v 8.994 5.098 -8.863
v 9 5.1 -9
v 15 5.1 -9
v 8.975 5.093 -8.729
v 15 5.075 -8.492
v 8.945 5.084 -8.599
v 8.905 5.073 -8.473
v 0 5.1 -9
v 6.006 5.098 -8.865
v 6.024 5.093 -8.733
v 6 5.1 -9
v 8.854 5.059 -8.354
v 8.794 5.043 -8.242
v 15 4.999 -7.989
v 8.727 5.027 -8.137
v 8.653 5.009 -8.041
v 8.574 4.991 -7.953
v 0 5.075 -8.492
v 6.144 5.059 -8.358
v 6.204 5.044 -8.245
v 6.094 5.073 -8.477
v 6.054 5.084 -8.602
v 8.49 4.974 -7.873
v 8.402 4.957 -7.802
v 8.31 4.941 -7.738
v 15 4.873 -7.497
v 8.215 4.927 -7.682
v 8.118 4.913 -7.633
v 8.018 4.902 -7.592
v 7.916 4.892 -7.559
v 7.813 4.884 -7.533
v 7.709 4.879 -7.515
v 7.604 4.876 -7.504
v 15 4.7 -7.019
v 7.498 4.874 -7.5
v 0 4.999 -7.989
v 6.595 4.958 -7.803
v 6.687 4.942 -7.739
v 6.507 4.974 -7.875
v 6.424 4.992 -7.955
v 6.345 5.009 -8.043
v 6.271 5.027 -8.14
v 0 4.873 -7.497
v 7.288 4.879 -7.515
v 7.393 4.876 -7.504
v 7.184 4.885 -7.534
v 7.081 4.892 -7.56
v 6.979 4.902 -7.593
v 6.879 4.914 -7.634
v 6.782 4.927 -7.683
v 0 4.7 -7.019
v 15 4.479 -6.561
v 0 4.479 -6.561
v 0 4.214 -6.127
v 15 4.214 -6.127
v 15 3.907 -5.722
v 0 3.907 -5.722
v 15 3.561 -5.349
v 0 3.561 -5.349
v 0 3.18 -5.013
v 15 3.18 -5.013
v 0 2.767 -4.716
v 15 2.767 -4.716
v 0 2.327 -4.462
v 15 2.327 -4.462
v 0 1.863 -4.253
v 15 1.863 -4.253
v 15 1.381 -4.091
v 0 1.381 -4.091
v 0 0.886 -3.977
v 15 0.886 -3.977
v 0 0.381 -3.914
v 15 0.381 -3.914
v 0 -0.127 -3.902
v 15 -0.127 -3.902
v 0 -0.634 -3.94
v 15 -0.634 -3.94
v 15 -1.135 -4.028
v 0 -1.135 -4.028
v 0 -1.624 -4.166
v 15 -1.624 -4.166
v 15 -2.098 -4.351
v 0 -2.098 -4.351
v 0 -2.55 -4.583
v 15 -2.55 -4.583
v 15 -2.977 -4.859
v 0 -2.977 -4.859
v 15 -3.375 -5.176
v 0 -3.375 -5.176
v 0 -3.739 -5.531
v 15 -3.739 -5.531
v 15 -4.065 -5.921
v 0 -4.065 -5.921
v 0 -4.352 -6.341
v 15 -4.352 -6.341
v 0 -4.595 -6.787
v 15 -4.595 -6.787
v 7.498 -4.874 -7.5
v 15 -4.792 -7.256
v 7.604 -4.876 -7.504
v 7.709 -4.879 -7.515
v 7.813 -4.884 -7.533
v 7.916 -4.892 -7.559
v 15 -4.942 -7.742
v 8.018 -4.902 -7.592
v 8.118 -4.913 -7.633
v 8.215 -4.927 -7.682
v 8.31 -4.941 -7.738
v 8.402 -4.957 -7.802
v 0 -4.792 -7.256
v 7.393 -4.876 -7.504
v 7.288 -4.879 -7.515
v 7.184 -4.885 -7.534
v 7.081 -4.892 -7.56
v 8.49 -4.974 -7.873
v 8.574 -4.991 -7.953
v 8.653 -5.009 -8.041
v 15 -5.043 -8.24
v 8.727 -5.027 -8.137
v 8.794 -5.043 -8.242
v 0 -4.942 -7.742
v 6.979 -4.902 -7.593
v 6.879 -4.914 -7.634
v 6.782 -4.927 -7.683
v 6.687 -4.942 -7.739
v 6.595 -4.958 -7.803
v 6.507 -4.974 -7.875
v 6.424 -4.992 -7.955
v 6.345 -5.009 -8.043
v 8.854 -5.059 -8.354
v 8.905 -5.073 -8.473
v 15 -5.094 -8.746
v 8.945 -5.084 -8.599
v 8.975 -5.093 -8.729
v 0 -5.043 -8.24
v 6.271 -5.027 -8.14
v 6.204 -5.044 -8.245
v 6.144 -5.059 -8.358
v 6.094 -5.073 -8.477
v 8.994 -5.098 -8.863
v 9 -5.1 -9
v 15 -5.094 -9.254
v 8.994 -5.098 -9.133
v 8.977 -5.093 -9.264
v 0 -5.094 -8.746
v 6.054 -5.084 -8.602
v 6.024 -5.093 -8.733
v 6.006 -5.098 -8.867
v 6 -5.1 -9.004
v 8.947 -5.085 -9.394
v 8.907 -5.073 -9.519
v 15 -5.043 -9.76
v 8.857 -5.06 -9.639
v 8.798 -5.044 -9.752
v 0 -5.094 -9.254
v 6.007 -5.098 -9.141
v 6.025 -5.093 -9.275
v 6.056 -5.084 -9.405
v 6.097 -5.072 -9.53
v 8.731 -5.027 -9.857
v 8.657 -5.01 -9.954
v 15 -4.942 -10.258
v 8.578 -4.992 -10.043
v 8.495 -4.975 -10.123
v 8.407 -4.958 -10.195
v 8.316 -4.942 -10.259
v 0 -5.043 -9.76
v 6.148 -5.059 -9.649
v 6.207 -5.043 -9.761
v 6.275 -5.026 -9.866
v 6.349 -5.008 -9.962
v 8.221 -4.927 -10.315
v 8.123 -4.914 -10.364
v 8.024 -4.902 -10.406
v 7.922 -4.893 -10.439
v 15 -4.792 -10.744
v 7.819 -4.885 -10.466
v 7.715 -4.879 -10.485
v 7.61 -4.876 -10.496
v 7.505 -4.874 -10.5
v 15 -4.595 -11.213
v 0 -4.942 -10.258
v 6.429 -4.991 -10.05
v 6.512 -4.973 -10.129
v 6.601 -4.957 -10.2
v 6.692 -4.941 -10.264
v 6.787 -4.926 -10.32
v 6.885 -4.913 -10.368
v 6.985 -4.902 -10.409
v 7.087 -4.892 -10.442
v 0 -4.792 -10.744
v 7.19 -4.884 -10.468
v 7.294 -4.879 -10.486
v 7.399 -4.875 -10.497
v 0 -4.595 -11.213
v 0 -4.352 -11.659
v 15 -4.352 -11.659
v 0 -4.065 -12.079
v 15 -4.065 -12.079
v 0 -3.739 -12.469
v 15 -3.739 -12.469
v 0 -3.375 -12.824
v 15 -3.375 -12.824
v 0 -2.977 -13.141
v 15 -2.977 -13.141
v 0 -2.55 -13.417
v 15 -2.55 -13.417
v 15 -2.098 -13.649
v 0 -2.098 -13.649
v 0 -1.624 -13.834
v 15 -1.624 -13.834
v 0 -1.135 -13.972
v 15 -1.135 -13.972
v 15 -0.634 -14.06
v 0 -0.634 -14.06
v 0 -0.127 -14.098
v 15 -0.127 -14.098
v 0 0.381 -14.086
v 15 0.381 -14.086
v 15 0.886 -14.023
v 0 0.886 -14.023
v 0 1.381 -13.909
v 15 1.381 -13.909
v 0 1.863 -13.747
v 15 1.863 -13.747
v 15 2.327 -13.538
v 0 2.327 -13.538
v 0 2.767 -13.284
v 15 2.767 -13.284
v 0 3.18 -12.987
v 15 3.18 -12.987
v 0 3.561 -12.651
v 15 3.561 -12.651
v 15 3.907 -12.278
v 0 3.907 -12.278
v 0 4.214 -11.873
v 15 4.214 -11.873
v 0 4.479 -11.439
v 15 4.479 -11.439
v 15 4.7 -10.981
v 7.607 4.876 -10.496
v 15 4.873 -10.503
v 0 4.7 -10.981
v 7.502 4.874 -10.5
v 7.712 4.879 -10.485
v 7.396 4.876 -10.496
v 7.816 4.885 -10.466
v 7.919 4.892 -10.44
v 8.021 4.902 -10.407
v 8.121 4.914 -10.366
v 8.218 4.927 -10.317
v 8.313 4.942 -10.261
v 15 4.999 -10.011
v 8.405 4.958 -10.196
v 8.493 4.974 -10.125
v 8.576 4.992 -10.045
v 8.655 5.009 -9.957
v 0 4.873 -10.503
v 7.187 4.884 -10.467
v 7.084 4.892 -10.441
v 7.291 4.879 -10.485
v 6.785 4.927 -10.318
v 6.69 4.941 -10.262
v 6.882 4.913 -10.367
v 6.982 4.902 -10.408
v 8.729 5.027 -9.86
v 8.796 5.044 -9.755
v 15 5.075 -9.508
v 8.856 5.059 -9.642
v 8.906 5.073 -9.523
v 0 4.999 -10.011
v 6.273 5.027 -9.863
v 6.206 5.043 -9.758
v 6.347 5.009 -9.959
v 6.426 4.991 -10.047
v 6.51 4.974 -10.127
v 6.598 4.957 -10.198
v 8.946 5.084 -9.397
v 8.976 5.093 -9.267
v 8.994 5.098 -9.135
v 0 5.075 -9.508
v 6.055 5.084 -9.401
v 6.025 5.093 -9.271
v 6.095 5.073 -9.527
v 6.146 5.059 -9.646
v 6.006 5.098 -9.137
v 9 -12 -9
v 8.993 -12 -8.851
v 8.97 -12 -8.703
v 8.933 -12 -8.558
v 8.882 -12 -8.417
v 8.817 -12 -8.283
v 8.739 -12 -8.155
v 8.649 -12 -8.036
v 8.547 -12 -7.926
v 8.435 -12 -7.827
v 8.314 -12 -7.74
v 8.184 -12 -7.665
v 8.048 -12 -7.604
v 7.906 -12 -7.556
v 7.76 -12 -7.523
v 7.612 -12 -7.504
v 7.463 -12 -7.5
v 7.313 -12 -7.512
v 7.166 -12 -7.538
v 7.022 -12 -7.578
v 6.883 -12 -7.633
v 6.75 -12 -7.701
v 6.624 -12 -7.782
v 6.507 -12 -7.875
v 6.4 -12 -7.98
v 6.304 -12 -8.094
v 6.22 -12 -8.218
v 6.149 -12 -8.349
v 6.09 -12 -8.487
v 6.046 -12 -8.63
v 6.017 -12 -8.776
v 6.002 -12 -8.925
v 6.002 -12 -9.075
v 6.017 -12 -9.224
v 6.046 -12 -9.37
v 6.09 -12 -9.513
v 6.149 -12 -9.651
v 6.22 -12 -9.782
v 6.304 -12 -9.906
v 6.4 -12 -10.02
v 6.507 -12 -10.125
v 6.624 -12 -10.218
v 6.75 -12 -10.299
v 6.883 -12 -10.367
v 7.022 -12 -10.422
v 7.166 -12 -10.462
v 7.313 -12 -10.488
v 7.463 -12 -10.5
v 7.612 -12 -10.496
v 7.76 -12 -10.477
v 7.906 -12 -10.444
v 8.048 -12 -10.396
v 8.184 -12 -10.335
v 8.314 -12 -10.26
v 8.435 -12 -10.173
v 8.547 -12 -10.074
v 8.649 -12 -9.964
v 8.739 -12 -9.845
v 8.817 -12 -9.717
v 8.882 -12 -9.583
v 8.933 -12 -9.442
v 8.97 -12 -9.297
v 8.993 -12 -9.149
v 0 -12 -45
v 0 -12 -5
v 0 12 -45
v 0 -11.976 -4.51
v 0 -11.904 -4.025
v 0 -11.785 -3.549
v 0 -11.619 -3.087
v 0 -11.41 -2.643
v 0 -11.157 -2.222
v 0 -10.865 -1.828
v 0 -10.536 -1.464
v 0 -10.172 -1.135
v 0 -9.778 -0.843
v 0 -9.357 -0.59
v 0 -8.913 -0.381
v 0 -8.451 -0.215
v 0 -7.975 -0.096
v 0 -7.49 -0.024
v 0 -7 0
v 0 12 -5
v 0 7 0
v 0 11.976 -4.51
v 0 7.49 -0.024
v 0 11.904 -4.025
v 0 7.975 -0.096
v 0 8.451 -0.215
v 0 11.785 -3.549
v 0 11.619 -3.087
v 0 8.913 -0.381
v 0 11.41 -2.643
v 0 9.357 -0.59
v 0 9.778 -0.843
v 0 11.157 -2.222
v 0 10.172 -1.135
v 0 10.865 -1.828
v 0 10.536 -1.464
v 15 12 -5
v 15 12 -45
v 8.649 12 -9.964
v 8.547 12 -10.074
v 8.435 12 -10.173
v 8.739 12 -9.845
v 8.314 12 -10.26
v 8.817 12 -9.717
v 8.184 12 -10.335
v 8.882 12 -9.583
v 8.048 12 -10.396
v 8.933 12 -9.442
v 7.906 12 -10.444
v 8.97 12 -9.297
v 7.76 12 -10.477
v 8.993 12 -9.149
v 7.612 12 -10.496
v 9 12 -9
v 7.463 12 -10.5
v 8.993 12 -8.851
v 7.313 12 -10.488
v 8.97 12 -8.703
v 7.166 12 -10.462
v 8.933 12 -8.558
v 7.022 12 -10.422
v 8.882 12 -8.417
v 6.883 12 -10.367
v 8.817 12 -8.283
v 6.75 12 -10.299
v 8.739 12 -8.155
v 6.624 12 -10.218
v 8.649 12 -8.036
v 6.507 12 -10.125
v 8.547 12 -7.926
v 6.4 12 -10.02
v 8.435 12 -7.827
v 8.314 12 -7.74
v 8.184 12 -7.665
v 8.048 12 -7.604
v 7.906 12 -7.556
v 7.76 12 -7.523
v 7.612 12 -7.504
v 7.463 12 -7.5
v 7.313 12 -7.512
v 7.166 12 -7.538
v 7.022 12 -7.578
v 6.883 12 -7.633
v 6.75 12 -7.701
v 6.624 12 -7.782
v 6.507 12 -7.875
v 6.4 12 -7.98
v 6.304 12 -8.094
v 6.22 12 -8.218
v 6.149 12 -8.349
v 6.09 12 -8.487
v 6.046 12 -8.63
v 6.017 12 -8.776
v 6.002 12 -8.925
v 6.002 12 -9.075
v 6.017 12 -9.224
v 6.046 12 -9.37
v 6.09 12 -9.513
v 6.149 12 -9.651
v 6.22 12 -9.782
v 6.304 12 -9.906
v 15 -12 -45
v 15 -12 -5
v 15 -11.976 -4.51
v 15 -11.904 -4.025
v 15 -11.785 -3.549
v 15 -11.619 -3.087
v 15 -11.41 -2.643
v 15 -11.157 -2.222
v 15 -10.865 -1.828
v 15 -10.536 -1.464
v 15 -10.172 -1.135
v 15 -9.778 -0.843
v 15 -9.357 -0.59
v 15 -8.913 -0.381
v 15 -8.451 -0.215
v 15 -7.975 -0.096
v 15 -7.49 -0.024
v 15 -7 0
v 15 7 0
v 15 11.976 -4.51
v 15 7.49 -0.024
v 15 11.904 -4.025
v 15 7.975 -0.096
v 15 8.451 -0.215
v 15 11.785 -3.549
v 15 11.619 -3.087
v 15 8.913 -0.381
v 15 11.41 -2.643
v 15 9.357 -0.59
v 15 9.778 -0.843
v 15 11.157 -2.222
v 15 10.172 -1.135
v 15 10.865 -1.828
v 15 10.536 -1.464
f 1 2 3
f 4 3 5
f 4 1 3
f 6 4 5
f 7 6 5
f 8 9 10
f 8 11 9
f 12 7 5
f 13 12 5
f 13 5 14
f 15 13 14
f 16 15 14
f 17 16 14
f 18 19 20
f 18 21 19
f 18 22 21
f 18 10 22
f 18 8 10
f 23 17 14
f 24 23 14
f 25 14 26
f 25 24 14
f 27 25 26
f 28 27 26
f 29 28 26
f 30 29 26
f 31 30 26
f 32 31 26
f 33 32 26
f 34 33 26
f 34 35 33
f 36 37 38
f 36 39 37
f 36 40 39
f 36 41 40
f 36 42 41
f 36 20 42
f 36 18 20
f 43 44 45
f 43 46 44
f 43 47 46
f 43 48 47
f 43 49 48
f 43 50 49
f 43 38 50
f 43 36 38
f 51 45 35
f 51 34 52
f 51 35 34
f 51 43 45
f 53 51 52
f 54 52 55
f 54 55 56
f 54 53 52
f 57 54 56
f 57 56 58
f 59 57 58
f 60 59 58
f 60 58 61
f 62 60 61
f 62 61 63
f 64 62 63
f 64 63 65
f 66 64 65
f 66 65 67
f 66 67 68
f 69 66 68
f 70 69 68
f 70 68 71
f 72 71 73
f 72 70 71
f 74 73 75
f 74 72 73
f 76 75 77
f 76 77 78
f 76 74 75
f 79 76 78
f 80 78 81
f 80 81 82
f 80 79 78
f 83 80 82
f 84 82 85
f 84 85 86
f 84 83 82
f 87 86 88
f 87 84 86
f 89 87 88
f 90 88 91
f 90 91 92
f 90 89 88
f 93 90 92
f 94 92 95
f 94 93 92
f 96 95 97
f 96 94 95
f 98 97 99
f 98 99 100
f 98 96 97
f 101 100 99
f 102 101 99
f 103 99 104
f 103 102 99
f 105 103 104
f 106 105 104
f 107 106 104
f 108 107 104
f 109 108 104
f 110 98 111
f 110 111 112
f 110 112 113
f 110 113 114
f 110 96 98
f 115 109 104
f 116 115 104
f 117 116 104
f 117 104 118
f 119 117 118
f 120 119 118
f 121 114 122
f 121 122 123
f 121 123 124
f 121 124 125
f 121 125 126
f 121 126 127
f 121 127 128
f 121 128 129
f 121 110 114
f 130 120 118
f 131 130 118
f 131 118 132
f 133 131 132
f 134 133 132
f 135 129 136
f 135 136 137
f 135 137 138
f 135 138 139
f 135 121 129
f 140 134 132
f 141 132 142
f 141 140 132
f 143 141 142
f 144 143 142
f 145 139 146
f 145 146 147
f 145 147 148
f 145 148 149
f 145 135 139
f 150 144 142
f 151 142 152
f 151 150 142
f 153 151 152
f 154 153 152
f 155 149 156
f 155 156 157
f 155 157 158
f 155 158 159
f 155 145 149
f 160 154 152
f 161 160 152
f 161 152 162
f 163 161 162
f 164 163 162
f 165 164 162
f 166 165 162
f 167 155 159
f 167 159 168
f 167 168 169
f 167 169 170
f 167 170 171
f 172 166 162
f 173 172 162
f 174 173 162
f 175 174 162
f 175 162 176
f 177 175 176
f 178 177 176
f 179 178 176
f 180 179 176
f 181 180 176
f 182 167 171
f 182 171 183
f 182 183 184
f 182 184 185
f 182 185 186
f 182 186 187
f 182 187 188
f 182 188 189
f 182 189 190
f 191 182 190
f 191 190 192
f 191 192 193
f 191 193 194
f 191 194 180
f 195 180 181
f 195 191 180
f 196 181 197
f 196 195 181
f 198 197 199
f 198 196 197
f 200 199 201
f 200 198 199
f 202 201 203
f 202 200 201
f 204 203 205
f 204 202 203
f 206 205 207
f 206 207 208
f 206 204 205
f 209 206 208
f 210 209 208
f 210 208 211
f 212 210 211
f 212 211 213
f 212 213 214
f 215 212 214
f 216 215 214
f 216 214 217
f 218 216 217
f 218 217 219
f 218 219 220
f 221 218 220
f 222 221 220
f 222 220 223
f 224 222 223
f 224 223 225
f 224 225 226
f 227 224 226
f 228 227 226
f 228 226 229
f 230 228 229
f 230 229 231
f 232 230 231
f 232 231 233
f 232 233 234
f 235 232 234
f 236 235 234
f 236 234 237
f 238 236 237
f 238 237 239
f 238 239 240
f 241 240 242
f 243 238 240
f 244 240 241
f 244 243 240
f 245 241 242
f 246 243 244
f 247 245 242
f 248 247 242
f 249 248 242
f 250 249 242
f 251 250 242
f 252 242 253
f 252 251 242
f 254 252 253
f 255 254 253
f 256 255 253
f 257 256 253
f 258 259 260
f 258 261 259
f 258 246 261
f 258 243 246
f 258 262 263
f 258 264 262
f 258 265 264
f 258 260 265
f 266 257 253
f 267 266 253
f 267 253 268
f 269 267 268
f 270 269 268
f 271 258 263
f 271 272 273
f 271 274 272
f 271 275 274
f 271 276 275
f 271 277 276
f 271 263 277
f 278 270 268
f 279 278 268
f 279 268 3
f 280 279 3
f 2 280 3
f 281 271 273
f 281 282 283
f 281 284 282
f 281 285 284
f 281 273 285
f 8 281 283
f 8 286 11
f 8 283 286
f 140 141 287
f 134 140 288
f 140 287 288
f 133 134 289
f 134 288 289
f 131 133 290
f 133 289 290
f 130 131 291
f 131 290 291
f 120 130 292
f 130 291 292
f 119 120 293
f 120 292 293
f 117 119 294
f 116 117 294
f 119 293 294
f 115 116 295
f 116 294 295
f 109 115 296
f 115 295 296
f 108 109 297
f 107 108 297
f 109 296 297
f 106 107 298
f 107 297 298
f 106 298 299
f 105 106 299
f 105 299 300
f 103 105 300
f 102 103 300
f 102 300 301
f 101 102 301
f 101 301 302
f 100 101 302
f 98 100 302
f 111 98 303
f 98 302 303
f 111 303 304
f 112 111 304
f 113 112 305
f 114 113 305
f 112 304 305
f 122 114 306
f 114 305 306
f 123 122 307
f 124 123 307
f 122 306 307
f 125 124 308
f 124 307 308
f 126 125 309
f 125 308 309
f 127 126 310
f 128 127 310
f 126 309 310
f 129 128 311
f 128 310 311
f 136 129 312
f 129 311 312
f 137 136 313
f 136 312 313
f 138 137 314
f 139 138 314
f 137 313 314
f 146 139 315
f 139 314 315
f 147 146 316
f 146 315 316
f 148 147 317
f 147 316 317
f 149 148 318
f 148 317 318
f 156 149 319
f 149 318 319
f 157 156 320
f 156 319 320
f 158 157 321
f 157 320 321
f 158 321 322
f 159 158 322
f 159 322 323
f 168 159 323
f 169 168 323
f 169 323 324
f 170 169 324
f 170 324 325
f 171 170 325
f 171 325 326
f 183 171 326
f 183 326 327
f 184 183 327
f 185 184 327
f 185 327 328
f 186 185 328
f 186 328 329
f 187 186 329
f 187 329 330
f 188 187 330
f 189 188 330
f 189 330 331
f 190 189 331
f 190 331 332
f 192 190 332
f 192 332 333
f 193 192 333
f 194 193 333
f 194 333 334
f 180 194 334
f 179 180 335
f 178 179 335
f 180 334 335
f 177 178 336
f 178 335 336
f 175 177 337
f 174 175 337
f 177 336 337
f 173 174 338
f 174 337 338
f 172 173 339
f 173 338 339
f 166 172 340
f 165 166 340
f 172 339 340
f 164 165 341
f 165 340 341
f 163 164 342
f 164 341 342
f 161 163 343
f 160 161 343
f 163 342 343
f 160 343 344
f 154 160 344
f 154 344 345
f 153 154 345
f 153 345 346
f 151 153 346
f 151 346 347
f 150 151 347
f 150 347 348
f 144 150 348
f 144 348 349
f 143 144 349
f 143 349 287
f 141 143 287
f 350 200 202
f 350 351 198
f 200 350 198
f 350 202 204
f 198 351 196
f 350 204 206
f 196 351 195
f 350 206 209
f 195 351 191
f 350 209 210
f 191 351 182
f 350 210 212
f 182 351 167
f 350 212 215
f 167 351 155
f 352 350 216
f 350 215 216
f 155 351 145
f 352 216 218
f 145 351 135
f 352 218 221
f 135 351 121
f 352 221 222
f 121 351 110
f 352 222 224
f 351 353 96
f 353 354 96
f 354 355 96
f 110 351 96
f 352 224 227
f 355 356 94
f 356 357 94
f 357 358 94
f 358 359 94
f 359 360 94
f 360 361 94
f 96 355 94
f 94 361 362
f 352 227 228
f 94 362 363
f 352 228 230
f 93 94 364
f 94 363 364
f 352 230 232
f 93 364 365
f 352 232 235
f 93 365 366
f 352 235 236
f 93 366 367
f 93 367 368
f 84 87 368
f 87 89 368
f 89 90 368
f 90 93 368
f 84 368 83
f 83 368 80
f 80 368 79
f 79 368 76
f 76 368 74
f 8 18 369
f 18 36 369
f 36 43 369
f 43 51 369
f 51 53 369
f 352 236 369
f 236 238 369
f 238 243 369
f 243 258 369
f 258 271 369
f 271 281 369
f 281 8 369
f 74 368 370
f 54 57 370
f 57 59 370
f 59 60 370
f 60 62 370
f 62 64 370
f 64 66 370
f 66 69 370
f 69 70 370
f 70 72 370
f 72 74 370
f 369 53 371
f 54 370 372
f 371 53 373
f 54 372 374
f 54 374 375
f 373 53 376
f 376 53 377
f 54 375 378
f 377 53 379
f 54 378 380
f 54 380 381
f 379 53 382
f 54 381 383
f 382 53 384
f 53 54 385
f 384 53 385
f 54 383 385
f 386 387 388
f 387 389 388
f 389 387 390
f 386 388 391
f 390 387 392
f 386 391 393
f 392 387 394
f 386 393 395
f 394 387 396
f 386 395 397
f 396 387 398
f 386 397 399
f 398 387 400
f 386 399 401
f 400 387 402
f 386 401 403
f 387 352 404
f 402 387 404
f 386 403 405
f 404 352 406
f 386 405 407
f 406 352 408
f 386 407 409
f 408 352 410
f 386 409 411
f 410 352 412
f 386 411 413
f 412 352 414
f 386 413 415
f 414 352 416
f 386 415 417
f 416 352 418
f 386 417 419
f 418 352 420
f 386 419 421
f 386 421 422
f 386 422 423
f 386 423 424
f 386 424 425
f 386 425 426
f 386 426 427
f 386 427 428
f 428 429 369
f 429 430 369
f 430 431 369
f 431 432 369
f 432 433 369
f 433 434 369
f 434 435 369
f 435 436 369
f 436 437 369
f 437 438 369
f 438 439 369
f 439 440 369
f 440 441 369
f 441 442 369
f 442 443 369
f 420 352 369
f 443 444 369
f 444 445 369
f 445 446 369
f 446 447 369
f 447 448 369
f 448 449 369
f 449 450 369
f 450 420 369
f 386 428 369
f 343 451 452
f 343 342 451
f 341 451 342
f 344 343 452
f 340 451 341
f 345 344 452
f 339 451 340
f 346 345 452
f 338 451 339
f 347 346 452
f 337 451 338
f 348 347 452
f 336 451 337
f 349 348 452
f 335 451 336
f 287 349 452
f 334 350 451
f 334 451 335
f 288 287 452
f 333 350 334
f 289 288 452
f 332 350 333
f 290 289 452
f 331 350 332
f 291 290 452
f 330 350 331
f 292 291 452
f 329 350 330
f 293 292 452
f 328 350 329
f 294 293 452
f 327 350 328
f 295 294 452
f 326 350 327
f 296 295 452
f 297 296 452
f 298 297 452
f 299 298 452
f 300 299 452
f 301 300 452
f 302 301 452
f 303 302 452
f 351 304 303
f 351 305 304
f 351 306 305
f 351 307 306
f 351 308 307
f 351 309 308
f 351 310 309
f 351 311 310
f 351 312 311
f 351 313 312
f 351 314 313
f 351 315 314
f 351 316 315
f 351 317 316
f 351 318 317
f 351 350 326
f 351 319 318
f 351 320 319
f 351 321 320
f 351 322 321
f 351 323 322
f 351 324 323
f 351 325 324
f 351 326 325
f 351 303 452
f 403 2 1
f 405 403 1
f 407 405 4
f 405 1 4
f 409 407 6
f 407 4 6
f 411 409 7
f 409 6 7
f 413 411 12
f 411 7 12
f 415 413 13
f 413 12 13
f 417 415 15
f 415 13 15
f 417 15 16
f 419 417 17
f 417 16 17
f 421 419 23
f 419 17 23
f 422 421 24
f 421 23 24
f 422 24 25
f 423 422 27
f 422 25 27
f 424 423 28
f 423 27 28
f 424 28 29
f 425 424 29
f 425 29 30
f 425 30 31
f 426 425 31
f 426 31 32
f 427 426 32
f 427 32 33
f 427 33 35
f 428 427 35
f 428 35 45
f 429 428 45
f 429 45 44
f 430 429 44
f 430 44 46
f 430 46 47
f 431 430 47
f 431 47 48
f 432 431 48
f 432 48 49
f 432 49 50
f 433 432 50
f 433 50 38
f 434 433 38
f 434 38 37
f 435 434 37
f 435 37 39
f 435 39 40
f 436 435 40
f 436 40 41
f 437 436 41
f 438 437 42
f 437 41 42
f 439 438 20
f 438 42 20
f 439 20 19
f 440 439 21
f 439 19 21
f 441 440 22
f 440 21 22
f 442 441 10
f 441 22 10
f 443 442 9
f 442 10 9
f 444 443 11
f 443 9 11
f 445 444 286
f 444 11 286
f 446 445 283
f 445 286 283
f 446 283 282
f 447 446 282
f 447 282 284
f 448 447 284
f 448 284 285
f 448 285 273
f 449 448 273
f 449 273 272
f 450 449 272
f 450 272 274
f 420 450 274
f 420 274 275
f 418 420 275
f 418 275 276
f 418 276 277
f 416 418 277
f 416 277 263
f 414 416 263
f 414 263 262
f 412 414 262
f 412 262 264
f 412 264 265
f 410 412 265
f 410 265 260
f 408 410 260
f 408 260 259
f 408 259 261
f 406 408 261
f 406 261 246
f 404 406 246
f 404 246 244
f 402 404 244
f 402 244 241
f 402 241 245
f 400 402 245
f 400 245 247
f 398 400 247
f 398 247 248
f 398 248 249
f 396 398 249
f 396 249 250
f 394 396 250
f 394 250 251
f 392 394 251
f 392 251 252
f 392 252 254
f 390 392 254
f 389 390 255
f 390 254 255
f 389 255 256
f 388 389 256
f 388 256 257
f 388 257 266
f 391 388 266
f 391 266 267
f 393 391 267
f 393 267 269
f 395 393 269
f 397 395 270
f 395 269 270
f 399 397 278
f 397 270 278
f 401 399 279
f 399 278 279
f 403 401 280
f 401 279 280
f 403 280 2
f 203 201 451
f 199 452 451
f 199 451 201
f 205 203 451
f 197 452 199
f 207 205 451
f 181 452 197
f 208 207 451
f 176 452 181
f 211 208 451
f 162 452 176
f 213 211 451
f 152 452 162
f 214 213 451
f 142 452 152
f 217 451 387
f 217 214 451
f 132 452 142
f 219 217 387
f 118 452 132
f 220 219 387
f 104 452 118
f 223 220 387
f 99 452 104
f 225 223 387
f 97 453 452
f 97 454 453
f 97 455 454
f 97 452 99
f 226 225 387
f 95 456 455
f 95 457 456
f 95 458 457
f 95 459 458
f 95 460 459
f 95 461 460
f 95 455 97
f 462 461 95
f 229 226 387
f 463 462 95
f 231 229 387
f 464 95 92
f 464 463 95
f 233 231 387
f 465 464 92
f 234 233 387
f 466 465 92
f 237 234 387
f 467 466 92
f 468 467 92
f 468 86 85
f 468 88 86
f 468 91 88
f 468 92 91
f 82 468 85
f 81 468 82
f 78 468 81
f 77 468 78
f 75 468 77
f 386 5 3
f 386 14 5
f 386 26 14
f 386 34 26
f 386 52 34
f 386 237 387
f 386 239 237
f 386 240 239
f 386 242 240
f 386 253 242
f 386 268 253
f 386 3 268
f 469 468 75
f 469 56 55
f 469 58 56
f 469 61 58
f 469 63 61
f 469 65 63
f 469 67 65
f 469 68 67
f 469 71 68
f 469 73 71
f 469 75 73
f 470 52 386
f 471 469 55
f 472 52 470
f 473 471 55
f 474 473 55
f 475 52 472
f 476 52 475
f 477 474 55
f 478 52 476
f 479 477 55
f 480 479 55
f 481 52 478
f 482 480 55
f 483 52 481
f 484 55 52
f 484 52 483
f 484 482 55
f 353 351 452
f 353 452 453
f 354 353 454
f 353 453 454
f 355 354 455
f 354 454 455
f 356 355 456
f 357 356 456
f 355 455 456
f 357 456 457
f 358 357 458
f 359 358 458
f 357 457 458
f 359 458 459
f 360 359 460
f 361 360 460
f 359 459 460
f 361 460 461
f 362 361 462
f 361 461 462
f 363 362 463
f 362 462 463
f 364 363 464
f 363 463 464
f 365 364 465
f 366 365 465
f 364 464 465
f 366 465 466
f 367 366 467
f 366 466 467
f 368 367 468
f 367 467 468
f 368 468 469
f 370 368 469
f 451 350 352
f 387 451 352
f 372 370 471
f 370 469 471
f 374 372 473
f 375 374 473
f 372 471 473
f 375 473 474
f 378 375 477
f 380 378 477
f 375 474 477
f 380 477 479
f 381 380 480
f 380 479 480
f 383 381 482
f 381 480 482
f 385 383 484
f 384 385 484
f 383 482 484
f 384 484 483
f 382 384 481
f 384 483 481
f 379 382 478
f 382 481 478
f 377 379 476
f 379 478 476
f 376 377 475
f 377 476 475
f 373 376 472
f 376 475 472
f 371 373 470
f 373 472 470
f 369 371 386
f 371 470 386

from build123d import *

# Parameters (mm, degrees)
F0_W     = 24
F0_H     = 45
F0_R     = 5.1
F1_DEPTH = 15
F2_R     = 5
F3_R     = 1.5
F4_DEPTH = 24


with BuildPart() as f1:
    # F0 (on Right) → F1 (new body)
    with BuildSketch(Plane.YZ):
        with Locations((0, -22.5)):
            Rectangle(F0_W, F0_H)
        with Locations((0, -9)):
            Circle(F0_R, mode=Mode.SUBTRACT)
    extrude(amount=F1_DEPTH)

    # F2
    f2_edges = [f1.edges().sort_by_distance(p)[0] for p in [
        (7.5, 12, 0),
        (7.5, -12, 0),
    ]]
    fillet(f2_edges, radius=F2_R)

    # F3 (on face) → F4 (cut, through all)
    with BuildSketch(Plane.XZ.offset(12)):
        with Locations((7.5, -9)):
            Circle(F3_R)
    extrude(amount=-F4_DEPTH, mode=Mode.SUBTRACT)


solid = f1.part
